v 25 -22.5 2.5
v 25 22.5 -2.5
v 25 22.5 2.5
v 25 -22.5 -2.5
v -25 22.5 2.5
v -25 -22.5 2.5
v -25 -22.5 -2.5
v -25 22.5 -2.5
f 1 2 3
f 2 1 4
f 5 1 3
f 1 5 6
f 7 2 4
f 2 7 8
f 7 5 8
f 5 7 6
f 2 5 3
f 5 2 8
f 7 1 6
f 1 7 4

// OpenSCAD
// L-shaped mounting bracket for NEMA 17 stepper motor
// Units: millimetres
// Orientation: Base plate on XY plane (z=0), builds upward (+Z).
// Centered on origin in X and Y.

// --- Dimensions ---
// Base Plate
base_width = 50;      // x from -25 to 25
base_depth = 45;      // y from 0 to 45
base_thickness = 5;   // z from 0 to 5

// Vertical Motor Plate
vertical_width = 50;  // x from -25 to 25
vertical_depth = 5;   // y from 0 to 5
vertical_height = 50; // z from 0 to 50

// Gussets
gusset_thickness = 5; // x thickness
gusset_leg_y = 20;    // leg along +Y
gusset_leg_z = 20;    // leg along +Z

// Holes
base_hole_diameter = 4.5; // M4
base_hole_x = 17;        // x = +/- 17
base_hole_y = 30;        // y = 30

motor_boss_hole_diameter = 23; // 23 mm hole
motor_boss_hole_x = 0;         // x = 0
motor_boss_hole_z = 28;        // z = 28

screw_hole_diameter = 3.4; // M3
screw_pattern_size = 31;   // 31 mm square pattern
screw_hole_x_offset = screw_pattern_size / 2; // 15.5
screw_hole_z_offset = screw_pattern_size / 2; // 15.5

// --- Cut Offset ---
// Constraint 5: Difference cuts must extend 0.01-1 mm past faces.
cut_offset = 0.1; 

// --- Main Assembly ---
difference() {
    // 1. Base Plate (z = 0 to 5)
    cube([base_width, base_depth, base_thickness], center = true);
    
    // 2. Vertical Motor Plate (standing on back edge of base at y = 45)
    // Plate extends from y = 45 to y = 50
    translate([0, base_depth, 0])
    cube([vertical_width, vertical_depth, vertical_height], center = true);
    
    // 3. Gussets
    // Left Gusset: x = -25 to -20, at junction y = 45, z = 5
    // Right Gusset: x = 20 to 25, at junction y = 45, z = 5
    // Right-angle corner at y = 5, z = 5 (relative to gusset position)
    // Gussets extend +Y (20mm) and +Z (20mm) from the corner
    
    // Left Gusset
    translate([-gusset_thickness/2, base_depth, base_thickness])
    linear_extrude(gusset_thickness)
    polygon([
        [0, 0],
        [gusset_leg_y, 0],
        [gusset_leg_y, gusset_leg_z],
        [0, gusset_leg_z]
    ]);
    
    // Right Gusset
    translate([gusset_thickness/2, base_depth, base_thickness])
    linear_extrude(gusset_thickness)
    polygon([
        [0, 0],
        [gusset_leg_y, 0],
        [gusset_leg_y, gusset_leg_z],
        [0, gusset_leg_z]
    ]);
    
    // 4. Base holes (M4) - two holes at y = 30
    for (i = [-1, 1]) {
        translate([i * base_hole_x, base_hole_y, 0])
        cylinder(d = base_hole_diameter + cut_offset, h = base_thickness + cut_offset, $fn = 64);
    }
    
    // 5. Motor boss hole (23mm) - through vertical plate
    // Centered at x = 0, z = 28 relative to part origin
    translate([motor_boss_hole_x, base_depth + vertical_depth/2, motor_boss_hole_z])
    cylinder(d = motor_boss_hole_diameter + cut_offset, h = vertical_height + cut_offset, $fn = 64);
    
    // 6. M3 screw holes (4 holes on 31mm square pattern)
    for (i = [-1, 1]) {
        for (j = [-1, 1]) {
            translate([
                motor_boss_hole_x + i * screw_hole_x_offset,
                base_depth + vertical_depth/2 + j * screw_hole_z_offset,
                motor_boss_hole_z
            ])
            cylinder(d = screw_hole_diameter + cut_offset, h = vertical_height + cut_offset, $fn = 64);
        }
    }
}
